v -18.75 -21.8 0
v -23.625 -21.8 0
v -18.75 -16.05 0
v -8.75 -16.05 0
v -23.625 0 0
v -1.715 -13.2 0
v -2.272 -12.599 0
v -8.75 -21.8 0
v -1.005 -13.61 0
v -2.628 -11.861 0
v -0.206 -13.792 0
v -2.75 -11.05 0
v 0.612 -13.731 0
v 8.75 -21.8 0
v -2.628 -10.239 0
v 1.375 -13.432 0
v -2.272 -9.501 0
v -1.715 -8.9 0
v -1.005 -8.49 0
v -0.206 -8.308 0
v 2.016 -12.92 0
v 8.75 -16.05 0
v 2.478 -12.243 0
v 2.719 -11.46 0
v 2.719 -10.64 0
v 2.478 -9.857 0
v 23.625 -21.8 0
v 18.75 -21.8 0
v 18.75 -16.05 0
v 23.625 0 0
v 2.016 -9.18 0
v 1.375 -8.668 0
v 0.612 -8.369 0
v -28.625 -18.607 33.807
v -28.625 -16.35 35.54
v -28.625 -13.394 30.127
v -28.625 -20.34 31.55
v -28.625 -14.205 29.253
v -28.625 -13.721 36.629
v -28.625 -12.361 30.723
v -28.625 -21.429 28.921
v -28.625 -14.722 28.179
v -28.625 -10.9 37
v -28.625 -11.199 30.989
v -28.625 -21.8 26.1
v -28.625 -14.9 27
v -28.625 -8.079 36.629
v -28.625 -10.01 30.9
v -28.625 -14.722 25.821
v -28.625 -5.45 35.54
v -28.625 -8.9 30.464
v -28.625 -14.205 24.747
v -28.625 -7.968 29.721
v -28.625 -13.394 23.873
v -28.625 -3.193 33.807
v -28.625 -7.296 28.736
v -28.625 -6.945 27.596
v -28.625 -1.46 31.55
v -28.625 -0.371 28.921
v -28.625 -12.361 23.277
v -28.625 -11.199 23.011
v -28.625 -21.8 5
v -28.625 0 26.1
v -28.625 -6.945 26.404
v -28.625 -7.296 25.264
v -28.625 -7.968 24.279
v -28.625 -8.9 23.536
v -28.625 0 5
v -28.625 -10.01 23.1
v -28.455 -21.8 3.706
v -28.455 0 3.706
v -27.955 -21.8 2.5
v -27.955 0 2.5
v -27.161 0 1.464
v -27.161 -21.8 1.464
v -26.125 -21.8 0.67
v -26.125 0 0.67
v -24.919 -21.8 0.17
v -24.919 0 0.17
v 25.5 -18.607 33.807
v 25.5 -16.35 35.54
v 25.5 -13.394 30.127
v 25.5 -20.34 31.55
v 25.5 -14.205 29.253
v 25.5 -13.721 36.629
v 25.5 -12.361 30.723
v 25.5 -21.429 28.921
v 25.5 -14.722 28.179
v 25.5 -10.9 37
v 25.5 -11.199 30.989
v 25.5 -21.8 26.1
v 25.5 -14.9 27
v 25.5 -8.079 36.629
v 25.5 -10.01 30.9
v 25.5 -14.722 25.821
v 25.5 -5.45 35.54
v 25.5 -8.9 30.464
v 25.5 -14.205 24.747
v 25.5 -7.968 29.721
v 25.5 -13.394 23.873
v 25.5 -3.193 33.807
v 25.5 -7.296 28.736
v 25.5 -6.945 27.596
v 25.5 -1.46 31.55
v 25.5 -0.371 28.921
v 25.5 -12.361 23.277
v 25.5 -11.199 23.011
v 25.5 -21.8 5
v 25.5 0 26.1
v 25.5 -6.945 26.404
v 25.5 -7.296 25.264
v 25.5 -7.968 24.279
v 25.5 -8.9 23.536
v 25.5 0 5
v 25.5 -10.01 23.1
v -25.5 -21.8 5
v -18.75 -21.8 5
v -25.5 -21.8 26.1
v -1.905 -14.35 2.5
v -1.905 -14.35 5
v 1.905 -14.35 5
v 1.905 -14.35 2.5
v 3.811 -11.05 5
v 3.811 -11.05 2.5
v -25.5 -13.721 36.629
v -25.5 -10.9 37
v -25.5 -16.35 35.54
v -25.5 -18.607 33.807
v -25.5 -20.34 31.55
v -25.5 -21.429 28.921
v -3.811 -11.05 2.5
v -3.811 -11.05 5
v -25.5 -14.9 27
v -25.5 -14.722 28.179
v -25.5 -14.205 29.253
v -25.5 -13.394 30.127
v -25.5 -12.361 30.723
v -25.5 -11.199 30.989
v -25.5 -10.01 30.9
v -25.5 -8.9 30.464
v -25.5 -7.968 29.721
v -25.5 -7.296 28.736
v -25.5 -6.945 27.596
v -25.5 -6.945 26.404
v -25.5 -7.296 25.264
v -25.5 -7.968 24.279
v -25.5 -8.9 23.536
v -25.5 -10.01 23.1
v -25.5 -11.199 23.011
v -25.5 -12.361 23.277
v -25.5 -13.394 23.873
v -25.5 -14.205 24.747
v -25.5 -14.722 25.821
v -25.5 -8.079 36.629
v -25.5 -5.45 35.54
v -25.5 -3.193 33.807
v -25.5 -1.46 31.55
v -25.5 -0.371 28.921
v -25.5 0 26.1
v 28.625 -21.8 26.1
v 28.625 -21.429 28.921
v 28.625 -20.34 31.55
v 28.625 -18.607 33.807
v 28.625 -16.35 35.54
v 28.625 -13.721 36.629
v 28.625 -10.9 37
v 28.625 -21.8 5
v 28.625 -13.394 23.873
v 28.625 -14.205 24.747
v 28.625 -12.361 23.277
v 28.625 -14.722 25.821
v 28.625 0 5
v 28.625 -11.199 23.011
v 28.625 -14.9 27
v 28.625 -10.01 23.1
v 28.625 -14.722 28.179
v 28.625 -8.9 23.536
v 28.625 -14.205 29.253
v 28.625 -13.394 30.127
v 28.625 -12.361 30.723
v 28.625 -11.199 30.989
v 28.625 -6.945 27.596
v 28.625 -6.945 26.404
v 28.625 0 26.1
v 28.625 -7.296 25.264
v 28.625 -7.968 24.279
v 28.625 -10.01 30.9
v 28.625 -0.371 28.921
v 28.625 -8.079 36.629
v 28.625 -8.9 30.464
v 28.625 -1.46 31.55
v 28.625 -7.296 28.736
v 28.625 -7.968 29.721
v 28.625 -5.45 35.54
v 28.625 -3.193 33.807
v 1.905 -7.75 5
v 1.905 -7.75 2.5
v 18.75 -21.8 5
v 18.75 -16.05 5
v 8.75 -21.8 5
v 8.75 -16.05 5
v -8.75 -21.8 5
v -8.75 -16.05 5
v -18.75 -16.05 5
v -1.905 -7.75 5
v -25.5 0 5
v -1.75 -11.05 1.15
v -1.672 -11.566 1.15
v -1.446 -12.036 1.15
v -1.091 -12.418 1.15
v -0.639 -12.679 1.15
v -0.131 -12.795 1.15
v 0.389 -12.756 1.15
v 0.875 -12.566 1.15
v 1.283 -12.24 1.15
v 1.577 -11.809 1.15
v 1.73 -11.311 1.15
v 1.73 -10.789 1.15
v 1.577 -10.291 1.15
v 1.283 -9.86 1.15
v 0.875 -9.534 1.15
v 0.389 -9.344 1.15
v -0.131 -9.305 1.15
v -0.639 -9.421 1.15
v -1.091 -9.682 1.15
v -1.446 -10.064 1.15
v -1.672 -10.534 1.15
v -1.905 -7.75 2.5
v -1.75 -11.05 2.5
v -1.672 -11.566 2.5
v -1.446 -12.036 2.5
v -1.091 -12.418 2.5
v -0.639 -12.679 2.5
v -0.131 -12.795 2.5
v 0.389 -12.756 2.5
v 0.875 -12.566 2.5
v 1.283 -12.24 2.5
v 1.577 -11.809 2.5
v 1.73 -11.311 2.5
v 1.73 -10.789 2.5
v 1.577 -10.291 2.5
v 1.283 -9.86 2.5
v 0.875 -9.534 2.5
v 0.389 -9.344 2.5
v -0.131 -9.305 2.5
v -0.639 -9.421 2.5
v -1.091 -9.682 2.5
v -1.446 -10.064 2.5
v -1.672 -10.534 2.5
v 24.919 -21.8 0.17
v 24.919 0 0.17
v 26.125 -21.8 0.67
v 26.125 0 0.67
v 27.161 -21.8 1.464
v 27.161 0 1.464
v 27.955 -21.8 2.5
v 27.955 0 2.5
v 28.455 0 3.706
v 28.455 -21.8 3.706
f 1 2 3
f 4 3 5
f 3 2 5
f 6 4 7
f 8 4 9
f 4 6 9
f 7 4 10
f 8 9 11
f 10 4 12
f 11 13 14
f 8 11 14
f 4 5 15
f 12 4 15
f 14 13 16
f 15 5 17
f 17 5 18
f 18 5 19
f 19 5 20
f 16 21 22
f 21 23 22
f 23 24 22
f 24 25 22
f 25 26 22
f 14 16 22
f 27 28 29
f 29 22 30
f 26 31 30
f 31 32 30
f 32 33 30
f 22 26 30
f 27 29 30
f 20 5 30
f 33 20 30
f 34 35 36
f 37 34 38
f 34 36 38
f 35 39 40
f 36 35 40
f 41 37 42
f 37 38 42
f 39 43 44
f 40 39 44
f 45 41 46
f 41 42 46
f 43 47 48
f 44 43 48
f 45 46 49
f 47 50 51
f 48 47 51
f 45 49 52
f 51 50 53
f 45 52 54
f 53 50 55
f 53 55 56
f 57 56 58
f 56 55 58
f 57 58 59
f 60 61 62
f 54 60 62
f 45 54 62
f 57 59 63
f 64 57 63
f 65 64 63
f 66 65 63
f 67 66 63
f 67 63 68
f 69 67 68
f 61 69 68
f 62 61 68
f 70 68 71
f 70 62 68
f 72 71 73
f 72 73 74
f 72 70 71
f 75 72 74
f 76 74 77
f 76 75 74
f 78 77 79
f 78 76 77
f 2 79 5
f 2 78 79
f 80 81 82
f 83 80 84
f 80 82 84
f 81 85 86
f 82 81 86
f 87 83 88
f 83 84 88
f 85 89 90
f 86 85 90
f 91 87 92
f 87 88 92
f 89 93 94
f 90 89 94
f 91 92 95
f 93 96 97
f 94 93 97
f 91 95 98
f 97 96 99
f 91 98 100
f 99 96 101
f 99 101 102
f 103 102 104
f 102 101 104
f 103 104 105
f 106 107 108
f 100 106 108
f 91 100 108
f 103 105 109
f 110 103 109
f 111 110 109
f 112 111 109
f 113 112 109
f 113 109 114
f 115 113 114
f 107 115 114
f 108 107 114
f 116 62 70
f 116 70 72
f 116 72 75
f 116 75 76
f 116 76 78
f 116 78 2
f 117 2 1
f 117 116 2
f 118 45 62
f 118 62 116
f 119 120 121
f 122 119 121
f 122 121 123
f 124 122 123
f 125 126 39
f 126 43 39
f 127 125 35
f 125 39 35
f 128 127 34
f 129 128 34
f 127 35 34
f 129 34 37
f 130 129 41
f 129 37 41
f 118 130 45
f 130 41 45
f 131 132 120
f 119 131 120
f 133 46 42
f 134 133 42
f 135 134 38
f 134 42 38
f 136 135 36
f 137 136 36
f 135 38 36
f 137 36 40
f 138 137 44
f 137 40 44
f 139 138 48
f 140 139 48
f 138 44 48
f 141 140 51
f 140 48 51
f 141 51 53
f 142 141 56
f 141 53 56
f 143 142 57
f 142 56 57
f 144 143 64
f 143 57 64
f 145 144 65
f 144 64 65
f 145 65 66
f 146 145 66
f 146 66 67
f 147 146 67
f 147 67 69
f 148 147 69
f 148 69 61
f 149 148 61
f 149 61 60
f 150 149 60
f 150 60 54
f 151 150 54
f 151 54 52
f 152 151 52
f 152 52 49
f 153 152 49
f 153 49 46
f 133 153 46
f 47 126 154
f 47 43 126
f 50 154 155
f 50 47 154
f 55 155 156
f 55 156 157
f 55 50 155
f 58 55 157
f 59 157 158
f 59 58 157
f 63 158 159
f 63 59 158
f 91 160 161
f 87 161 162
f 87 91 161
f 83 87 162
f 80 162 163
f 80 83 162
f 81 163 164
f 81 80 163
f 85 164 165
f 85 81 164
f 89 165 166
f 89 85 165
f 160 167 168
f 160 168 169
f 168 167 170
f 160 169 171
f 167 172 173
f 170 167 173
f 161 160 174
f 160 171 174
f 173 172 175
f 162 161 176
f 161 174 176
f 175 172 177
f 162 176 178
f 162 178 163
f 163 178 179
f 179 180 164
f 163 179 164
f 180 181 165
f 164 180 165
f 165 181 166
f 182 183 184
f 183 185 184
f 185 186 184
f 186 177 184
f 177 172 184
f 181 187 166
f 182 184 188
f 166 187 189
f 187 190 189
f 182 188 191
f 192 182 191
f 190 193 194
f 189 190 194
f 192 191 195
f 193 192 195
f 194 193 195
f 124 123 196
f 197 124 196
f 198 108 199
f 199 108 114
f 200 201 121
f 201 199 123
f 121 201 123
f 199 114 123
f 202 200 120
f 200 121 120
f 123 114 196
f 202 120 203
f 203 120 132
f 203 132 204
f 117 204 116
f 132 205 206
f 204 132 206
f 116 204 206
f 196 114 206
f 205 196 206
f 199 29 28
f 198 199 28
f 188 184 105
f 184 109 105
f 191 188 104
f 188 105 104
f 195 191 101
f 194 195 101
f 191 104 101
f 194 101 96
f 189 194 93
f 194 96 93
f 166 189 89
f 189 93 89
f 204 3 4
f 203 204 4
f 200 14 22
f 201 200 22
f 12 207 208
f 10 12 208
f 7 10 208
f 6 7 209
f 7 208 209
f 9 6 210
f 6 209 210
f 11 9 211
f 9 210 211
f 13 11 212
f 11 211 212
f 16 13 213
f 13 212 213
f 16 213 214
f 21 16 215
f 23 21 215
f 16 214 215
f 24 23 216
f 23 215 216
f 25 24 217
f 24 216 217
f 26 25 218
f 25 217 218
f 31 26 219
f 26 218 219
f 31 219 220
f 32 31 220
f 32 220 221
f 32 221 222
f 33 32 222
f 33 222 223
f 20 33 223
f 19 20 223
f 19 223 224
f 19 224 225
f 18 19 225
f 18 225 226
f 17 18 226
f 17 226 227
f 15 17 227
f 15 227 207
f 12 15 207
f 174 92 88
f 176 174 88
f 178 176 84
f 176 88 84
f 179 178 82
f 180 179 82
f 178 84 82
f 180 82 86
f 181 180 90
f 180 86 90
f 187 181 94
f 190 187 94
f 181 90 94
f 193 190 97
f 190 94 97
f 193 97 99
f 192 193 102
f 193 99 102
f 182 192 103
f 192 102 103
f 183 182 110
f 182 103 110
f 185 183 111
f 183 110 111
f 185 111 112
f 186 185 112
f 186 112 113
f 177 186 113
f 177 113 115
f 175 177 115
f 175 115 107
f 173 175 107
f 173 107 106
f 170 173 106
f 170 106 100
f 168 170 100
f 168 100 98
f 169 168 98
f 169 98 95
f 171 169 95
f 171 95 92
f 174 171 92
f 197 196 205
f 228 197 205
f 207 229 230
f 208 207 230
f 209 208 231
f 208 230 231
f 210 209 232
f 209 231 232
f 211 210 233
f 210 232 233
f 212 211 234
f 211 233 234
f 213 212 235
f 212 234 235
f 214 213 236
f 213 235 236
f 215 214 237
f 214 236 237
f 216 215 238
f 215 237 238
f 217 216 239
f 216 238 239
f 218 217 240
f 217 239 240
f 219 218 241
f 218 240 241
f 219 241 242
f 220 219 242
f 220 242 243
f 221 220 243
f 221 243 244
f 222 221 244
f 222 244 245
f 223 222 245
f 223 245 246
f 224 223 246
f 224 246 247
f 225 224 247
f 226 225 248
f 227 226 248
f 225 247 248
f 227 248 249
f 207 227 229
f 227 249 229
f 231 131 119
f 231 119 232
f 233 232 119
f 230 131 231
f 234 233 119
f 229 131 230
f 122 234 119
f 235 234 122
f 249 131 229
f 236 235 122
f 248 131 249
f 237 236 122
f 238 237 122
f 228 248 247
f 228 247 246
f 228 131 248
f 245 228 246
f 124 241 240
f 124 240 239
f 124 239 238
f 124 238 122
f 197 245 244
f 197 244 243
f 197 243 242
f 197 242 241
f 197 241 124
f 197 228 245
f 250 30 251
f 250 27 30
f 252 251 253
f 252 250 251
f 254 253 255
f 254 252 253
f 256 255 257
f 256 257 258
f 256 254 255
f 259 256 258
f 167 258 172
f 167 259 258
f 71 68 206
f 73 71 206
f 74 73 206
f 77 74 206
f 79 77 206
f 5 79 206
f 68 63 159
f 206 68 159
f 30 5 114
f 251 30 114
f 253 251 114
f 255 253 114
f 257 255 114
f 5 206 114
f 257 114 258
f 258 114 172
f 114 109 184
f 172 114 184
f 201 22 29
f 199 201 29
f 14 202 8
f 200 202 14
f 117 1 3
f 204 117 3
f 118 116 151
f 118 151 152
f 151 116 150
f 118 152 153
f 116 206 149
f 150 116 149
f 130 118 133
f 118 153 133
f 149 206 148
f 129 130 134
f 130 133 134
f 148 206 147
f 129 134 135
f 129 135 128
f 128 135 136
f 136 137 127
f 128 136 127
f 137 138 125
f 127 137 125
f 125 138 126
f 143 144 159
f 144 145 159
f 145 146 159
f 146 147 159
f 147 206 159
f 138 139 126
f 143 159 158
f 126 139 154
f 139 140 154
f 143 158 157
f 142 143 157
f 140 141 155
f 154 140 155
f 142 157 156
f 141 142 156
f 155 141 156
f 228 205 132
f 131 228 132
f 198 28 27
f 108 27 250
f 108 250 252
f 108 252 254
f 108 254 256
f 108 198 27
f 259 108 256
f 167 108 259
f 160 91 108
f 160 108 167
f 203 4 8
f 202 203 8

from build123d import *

# Parameters (mm, degrees)
F1_DEPTH       = 21.8
F2_R           = 4
F3_DEPTH       = 69.8
F4_R           = 10.89999
F5_W           = 10
F5_H           = 5.75
F5_H_2         = 0.9999994934
F6_DEPTH       = 25
F7_D           = 3.5
F7_DEPTH       = 10
F7_CSINK_D     = 5.5
F7_CSINK_ANGLE = 82
F7_TIP         = 1.0515060833
F8_R           = 1.75
F9_DEPTH       = 2.5
F10_R          = 5


# Not quite as in the source:
# - a fillet or chamfer is up to 0.001 mm smaller than in the source, because OpenCascade refuses the exact size


with BuildPart() as f1:
    # F0 (on Front) → F1 (new body)
    with BuildSketch(Plane.XZ):
        Polygon((-25.5, 37), (-28.625, 37), (-28.625, 0), (28.625, 0), (28.625, 37), (25.5, 37), (25.5, 5), (-25.5, 5), align=None)
    extrude(amount=F1_DEPTH)

    # F2 (on face) → F3 (cut)
    with BuildSketch(Plane(origin=(-28.625, 0, 0), x_dir=(0, -1, 0), z_dir=(-1, 0, 0))):
        with Locations((10.9, 27)):
            Circle(F2_R)
    extrude(amount=-F3_DEPTH, mode=Mode.SUBTRACT)

    # F4 (radius 10.9 in the source; OpenCascade refuses exactly that, so slightly less here)
    f4_edges = [f1.edges().sort_by_distance(p)[0] for p in [
        (-27.0625, -21.8, 37),
        (-27.0625, 0, 37),
        (27.0625, 0, 37),
        (27.0625, -21.8, 37),
    ]]
    fillet(f4_edges, radius=F4_R)

    # F5 (on face) → F6 (cut)
    with BuildSketch(Plane(origin=(0, 0, 0), x_dir=(1, 0, 0), z_dir=(0, 0, -1))):
        with Locations((-13.7500007451, 18.925)):
            Rectangle(F5_W, F5_H)
        with Locations((-13.7500007451, 22.2999997467)):
            Rectangle(F5_W, F5_H_2)
        with Locations((13.7500007451, 22.2999997467)):
            Rectangle(F5_W, F5_H_2)
        with Locations((13.7500007451, 18.925)):
            Rectangle(F5_W, F5_H)
    extrude(amount=-F6_DEPTH, mode=Mode.SUBTRACT)

    # F7
    with Locations(Plane(origin=(0, 0, 0), x_dir=(1, 0, 0), z_dir=(0, 0, -1))):
        with Locations((0, 11.05)):
            CounterSinkHole(F7_D / 2, F7_CSINK_D / 2, depth=F7_DEPTH, counter_sink_angle=F7_CSINK_ANGLE)
            with Locations((0, 0, -(F7_DEPTH + F7_TIP / 2))):  # 118° drill point
                Cone(0, F7_D / 2, F7_TIP, mode=Mode.SUBTRACT)

    # F8 (on face) → F9 (cut)
    with BuildSketch(Plane.XY.offset(5)):
        Polygon((1.9052558883, -7.75), (-1.9052558883, -7.75), (-3.8105117767, -11.05), (-1.9052558883, -14.35), (1.9052558883, -14.35), (3.8105117767, -11.05), align=None)
        with Locations((0, -11.05)):
            Circle(F8_R, mode=Mode.SUBTRACT)
    extrude(amount=-F9_DEPTH, mode=Mode.SUBTRACT)

    # F10
    f10_edges = [f1.edges().sort_by_distance(p)[0] for p in [
        (-28.625, -10.9, 0),
        (28.625, -10.9, 0),
    ]]
    fillet(f10_edges, radius=F10_R)


solid = f1.part
